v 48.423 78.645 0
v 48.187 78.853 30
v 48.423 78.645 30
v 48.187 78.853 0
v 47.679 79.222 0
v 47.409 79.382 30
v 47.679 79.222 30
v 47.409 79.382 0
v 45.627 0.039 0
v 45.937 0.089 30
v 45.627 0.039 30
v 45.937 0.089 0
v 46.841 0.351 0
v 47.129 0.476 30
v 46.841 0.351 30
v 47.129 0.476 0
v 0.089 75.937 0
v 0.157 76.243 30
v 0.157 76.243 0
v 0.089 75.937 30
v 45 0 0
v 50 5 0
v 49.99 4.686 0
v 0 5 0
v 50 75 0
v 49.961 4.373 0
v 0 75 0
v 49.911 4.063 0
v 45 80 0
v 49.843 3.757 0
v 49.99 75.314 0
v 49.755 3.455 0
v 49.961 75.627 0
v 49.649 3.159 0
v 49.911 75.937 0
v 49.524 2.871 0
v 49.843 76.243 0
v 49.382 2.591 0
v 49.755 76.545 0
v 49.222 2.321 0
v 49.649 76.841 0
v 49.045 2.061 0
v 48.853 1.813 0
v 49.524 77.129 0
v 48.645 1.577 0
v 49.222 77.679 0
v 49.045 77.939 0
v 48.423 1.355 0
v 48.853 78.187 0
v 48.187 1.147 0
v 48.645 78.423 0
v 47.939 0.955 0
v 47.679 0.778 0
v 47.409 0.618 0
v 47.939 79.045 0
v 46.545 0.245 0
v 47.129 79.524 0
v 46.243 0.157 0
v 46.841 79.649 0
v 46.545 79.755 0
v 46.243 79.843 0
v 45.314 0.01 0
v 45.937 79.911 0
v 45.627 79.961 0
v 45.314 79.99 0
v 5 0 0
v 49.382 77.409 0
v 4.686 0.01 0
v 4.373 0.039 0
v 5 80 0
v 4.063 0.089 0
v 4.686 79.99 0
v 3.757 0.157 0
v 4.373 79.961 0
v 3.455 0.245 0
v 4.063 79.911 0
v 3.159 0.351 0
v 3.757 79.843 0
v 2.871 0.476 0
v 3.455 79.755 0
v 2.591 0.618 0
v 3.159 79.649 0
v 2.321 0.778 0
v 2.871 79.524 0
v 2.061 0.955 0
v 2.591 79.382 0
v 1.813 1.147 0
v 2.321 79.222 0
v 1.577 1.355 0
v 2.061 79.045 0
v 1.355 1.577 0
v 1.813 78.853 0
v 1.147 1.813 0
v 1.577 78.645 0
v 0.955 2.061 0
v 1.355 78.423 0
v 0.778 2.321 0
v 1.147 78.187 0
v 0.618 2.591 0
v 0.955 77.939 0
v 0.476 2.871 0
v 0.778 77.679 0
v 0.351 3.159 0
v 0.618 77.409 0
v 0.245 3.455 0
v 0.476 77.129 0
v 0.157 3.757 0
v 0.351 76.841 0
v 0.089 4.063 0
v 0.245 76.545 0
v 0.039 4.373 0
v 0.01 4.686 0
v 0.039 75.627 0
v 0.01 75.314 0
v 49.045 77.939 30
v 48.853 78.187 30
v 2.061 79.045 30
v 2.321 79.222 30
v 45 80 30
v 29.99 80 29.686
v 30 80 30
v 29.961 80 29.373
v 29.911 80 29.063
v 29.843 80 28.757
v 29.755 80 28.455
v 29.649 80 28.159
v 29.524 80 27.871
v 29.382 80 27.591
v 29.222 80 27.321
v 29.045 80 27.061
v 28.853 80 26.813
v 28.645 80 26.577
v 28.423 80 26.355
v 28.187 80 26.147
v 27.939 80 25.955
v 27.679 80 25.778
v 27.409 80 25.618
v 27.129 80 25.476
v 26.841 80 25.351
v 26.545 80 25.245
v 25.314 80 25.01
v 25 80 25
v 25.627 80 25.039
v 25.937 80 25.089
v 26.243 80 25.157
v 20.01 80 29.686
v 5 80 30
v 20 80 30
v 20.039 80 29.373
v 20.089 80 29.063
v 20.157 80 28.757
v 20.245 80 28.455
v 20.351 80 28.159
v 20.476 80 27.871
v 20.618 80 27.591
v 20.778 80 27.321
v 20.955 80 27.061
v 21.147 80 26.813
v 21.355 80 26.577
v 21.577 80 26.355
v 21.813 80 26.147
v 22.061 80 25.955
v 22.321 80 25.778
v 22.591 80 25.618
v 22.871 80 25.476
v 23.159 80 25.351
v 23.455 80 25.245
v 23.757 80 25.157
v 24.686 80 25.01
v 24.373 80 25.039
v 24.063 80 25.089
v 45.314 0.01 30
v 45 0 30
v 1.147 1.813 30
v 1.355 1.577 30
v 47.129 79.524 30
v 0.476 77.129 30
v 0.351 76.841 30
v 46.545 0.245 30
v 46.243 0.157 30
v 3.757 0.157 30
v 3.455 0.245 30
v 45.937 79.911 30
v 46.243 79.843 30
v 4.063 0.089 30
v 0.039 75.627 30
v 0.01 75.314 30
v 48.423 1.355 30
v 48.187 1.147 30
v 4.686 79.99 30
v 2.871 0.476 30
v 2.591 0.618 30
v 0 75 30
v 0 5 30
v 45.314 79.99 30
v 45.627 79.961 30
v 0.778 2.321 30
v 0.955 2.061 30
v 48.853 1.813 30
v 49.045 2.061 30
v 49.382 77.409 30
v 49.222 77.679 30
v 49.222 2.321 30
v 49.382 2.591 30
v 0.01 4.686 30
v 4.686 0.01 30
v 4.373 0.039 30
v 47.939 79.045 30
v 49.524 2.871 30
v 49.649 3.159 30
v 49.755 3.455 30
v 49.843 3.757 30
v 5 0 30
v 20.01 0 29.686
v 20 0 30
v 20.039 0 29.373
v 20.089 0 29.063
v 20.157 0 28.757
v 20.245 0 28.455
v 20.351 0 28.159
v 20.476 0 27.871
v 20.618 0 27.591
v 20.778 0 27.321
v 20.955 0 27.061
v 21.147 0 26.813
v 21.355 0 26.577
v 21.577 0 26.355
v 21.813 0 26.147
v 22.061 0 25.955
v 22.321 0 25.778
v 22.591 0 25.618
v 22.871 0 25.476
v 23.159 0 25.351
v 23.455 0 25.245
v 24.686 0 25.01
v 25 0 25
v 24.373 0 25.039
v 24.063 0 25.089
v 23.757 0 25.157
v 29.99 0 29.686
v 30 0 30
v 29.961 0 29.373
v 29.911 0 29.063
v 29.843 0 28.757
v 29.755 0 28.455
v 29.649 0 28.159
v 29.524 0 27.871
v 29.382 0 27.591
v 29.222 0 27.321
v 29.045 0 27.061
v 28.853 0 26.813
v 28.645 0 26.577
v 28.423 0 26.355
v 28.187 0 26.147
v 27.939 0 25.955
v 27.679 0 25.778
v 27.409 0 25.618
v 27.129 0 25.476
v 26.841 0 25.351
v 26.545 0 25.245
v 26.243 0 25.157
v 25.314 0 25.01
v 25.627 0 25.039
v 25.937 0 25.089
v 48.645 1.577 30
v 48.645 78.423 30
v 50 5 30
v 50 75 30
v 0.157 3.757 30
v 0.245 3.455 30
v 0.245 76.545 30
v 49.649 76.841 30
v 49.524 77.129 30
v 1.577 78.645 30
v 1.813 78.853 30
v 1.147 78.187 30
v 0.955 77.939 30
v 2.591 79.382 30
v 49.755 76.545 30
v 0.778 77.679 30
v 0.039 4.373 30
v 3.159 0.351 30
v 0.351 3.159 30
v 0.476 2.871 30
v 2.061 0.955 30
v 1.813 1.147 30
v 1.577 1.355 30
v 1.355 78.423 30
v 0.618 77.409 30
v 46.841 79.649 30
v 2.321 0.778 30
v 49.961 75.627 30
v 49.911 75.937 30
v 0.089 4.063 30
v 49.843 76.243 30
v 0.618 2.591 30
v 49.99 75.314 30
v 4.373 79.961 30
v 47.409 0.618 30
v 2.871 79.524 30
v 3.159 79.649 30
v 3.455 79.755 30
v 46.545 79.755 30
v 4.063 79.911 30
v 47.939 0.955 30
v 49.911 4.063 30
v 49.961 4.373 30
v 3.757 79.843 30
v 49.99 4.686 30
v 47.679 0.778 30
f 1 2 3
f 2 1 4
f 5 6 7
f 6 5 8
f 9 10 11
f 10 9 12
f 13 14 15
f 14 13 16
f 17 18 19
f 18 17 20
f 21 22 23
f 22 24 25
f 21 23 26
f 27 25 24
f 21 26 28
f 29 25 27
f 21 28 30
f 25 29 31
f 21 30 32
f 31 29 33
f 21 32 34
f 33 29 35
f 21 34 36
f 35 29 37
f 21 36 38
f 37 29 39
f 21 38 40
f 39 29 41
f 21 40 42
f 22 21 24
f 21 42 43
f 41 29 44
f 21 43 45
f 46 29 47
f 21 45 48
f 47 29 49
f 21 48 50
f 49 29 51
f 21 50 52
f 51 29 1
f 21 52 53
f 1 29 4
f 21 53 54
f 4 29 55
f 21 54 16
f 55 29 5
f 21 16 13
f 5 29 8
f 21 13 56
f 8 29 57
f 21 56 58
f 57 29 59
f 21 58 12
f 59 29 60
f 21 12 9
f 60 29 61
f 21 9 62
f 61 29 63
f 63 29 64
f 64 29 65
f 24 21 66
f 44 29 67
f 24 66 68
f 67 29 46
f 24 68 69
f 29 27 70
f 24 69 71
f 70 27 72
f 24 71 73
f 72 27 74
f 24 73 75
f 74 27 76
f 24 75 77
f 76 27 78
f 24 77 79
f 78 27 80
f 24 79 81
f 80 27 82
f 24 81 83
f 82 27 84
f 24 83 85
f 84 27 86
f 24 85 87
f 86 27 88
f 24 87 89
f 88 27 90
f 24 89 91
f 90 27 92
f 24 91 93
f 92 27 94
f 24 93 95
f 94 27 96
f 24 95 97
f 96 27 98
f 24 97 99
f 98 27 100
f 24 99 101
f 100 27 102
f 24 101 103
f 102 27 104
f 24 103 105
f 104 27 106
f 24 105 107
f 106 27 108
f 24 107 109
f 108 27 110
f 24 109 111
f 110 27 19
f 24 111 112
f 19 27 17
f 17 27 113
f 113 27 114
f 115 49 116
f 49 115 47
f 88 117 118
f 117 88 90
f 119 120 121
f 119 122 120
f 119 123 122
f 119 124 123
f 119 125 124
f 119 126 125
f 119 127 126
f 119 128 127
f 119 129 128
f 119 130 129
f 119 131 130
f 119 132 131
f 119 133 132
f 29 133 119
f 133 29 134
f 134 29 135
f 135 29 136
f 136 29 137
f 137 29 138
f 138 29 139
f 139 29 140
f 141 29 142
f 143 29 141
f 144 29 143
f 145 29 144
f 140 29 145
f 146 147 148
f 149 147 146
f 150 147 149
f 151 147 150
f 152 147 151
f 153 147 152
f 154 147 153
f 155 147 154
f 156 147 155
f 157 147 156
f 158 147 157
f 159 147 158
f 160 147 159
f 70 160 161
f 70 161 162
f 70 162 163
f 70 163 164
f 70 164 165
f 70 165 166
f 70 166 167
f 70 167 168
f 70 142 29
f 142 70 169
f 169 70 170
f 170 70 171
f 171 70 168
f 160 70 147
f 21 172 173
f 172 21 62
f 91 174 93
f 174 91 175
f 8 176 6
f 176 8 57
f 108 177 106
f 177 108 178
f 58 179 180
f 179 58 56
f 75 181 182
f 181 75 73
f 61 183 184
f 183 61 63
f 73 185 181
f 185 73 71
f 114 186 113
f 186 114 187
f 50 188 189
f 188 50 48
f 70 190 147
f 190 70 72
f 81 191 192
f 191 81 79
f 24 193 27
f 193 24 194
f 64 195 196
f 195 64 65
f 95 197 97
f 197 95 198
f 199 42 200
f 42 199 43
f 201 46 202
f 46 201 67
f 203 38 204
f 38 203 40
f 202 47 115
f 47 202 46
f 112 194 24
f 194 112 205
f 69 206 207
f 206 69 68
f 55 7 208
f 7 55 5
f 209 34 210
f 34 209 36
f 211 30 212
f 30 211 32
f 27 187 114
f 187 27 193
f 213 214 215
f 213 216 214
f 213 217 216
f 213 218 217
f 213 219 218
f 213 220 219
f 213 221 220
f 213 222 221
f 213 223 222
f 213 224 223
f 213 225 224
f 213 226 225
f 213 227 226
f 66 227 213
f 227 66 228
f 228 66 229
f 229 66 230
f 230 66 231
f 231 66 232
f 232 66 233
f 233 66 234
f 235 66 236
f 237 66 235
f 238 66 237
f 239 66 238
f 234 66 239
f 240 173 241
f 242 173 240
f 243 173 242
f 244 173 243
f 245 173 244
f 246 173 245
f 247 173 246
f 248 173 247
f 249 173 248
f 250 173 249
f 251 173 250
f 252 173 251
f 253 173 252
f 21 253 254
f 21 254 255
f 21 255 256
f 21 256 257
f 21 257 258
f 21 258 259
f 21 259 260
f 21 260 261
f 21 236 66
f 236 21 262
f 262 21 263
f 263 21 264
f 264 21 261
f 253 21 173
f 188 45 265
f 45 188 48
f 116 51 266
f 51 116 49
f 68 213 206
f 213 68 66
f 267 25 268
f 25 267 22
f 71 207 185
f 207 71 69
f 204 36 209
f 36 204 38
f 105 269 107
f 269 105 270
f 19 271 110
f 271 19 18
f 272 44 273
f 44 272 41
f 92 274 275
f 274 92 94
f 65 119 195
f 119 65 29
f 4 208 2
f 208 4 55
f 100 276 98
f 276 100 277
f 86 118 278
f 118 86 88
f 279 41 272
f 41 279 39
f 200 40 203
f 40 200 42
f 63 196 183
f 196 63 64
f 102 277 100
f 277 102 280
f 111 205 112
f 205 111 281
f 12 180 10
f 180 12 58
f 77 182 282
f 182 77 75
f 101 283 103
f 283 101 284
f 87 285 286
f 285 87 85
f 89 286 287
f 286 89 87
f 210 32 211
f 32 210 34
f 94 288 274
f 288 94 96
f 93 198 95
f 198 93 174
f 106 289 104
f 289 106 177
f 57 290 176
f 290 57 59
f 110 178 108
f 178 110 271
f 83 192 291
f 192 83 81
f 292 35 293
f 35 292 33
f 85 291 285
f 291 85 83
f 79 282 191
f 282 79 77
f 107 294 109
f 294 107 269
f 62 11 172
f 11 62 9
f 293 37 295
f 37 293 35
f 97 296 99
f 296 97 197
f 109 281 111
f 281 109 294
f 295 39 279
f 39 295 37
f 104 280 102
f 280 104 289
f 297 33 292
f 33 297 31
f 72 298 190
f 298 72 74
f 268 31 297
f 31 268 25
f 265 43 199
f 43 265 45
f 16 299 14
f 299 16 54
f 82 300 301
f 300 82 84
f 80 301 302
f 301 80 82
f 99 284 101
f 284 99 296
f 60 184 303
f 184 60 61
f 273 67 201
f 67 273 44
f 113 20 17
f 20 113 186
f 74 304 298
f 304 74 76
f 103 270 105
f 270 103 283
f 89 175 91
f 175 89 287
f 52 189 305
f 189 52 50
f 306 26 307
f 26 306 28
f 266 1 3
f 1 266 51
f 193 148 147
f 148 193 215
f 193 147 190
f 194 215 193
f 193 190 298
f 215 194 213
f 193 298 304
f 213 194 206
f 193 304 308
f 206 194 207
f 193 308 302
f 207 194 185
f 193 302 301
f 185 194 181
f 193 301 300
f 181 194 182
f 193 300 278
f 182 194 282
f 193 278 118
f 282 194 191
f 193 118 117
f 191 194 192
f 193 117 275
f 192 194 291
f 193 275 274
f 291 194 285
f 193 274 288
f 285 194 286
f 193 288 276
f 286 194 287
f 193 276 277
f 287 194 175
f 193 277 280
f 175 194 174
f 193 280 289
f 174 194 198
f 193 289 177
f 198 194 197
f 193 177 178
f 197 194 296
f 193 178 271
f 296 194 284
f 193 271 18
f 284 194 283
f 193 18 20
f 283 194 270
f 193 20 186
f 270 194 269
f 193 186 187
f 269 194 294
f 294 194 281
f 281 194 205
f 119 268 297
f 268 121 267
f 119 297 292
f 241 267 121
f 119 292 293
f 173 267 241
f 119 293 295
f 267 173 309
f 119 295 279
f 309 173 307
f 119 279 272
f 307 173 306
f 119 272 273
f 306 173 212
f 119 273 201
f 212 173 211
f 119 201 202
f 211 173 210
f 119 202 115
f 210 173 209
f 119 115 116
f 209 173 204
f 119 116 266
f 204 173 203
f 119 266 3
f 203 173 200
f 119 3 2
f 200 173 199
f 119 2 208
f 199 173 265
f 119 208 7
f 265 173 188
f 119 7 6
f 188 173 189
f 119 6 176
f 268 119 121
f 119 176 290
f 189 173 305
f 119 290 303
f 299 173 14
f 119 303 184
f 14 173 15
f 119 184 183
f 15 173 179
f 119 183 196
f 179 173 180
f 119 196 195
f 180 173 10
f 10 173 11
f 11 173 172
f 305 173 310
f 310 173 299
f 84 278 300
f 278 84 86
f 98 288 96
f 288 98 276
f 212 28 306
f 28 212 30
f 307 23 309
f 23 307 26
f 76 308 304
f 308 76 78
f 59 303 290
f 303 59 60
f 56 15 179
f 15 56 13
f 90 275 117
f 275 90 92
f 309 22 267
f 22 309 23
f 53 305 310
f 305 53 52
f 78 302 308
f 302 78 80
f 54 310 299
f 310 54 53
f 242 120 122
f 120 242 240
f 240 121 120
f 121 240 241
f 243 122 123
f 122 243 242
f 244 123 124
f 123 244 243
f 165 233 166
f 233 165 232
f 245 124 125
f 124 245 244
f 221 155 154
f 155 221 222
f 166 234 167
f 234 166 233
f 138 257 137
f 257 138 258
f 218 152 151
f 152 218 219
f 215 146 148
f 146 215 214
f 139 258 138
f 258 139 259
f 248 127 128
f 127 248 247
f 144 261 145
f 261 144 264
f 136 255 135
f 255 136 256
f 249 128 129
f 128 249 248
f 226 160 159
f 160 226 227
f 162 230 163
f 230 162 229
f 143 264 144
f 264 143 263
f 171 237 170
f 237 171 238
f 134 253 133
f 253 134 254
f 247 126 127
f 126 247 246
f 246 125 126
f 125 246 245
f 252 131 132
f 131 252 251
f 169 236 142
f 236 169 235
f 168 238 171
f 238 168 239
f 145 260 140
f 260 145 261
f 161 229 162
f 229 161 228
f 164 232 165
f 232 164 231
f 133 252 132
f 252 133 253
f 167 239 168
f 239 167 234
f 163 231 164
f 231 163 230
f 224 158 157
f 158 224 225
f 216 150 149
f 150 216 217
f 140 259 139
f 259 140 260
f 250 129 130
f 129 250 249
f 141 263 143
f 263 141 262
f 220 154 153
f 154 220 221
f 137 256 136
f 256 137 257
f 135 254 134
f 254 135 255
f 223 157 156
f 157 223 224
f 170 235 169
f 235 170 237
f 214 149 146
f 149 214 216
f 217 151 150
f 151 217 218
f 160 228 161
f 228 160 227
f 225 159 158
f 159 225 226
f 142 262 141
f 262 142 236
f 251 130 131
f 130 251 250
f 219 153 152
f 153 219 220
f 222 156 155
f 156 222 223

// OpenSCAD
/*--------------------------------------------*/
/*  Castor Replacement Generator v1           */
/*  Created by Alex Keeling                   */
/*  thingiverse@keeling.me                    */
/*  License: Creative Commons - Public Domain */
/*  2016-7-17 First version on Thingiverse    */
/*--------------------------------------------*/

// preview[view:south west, tilt:top diagonal]

// How long should it be? (mm)
box_Length = 80; // [6:250]

// How wide should it be? (mm)
box_Width = 50; // [25:250]

// How tall should it be? (mm)
box_Height = 30; // [15:250]

//How deep should the groove be? (mm)
groove_Radius = 5; // [1:10]


/* [Hidden] */

grooveR = groove_Radius;
cylR = 5;
cylH = box_Height;
cylFN = 100;


boxW = box_Length - cylR * 2;
boxD = box_Width - cylR * 2;



difference(){
hull() {
translate([cylR, cylR, 0])
	cylinder(r=cylR, h=cylH, center=false, $fn=cylFN);

translate([cylR + boxD, cylR, 0])
	cylinder(r=cylR, h=cylH, center=false, $fn=cylFN);

translate([cylR, cylR + boxW, 0])
	cylinder(r=cylR, h=cylH, center=false, $fn=cylFN);

translate([cylR + boxD, cylR + boxW, 0])
	cylinder(r=cylR, h=cylH, center=false, $fn=cylFN);
}

translate([cylR + boxD / 2, -5, cylH])
	rotate([-90, 0, 0])
		cylinder(r=grooveR, h=boxW + cylR * 2 + 10, center=false, $fn=cylFN);
}

// Written by Alex Keeling 2016
